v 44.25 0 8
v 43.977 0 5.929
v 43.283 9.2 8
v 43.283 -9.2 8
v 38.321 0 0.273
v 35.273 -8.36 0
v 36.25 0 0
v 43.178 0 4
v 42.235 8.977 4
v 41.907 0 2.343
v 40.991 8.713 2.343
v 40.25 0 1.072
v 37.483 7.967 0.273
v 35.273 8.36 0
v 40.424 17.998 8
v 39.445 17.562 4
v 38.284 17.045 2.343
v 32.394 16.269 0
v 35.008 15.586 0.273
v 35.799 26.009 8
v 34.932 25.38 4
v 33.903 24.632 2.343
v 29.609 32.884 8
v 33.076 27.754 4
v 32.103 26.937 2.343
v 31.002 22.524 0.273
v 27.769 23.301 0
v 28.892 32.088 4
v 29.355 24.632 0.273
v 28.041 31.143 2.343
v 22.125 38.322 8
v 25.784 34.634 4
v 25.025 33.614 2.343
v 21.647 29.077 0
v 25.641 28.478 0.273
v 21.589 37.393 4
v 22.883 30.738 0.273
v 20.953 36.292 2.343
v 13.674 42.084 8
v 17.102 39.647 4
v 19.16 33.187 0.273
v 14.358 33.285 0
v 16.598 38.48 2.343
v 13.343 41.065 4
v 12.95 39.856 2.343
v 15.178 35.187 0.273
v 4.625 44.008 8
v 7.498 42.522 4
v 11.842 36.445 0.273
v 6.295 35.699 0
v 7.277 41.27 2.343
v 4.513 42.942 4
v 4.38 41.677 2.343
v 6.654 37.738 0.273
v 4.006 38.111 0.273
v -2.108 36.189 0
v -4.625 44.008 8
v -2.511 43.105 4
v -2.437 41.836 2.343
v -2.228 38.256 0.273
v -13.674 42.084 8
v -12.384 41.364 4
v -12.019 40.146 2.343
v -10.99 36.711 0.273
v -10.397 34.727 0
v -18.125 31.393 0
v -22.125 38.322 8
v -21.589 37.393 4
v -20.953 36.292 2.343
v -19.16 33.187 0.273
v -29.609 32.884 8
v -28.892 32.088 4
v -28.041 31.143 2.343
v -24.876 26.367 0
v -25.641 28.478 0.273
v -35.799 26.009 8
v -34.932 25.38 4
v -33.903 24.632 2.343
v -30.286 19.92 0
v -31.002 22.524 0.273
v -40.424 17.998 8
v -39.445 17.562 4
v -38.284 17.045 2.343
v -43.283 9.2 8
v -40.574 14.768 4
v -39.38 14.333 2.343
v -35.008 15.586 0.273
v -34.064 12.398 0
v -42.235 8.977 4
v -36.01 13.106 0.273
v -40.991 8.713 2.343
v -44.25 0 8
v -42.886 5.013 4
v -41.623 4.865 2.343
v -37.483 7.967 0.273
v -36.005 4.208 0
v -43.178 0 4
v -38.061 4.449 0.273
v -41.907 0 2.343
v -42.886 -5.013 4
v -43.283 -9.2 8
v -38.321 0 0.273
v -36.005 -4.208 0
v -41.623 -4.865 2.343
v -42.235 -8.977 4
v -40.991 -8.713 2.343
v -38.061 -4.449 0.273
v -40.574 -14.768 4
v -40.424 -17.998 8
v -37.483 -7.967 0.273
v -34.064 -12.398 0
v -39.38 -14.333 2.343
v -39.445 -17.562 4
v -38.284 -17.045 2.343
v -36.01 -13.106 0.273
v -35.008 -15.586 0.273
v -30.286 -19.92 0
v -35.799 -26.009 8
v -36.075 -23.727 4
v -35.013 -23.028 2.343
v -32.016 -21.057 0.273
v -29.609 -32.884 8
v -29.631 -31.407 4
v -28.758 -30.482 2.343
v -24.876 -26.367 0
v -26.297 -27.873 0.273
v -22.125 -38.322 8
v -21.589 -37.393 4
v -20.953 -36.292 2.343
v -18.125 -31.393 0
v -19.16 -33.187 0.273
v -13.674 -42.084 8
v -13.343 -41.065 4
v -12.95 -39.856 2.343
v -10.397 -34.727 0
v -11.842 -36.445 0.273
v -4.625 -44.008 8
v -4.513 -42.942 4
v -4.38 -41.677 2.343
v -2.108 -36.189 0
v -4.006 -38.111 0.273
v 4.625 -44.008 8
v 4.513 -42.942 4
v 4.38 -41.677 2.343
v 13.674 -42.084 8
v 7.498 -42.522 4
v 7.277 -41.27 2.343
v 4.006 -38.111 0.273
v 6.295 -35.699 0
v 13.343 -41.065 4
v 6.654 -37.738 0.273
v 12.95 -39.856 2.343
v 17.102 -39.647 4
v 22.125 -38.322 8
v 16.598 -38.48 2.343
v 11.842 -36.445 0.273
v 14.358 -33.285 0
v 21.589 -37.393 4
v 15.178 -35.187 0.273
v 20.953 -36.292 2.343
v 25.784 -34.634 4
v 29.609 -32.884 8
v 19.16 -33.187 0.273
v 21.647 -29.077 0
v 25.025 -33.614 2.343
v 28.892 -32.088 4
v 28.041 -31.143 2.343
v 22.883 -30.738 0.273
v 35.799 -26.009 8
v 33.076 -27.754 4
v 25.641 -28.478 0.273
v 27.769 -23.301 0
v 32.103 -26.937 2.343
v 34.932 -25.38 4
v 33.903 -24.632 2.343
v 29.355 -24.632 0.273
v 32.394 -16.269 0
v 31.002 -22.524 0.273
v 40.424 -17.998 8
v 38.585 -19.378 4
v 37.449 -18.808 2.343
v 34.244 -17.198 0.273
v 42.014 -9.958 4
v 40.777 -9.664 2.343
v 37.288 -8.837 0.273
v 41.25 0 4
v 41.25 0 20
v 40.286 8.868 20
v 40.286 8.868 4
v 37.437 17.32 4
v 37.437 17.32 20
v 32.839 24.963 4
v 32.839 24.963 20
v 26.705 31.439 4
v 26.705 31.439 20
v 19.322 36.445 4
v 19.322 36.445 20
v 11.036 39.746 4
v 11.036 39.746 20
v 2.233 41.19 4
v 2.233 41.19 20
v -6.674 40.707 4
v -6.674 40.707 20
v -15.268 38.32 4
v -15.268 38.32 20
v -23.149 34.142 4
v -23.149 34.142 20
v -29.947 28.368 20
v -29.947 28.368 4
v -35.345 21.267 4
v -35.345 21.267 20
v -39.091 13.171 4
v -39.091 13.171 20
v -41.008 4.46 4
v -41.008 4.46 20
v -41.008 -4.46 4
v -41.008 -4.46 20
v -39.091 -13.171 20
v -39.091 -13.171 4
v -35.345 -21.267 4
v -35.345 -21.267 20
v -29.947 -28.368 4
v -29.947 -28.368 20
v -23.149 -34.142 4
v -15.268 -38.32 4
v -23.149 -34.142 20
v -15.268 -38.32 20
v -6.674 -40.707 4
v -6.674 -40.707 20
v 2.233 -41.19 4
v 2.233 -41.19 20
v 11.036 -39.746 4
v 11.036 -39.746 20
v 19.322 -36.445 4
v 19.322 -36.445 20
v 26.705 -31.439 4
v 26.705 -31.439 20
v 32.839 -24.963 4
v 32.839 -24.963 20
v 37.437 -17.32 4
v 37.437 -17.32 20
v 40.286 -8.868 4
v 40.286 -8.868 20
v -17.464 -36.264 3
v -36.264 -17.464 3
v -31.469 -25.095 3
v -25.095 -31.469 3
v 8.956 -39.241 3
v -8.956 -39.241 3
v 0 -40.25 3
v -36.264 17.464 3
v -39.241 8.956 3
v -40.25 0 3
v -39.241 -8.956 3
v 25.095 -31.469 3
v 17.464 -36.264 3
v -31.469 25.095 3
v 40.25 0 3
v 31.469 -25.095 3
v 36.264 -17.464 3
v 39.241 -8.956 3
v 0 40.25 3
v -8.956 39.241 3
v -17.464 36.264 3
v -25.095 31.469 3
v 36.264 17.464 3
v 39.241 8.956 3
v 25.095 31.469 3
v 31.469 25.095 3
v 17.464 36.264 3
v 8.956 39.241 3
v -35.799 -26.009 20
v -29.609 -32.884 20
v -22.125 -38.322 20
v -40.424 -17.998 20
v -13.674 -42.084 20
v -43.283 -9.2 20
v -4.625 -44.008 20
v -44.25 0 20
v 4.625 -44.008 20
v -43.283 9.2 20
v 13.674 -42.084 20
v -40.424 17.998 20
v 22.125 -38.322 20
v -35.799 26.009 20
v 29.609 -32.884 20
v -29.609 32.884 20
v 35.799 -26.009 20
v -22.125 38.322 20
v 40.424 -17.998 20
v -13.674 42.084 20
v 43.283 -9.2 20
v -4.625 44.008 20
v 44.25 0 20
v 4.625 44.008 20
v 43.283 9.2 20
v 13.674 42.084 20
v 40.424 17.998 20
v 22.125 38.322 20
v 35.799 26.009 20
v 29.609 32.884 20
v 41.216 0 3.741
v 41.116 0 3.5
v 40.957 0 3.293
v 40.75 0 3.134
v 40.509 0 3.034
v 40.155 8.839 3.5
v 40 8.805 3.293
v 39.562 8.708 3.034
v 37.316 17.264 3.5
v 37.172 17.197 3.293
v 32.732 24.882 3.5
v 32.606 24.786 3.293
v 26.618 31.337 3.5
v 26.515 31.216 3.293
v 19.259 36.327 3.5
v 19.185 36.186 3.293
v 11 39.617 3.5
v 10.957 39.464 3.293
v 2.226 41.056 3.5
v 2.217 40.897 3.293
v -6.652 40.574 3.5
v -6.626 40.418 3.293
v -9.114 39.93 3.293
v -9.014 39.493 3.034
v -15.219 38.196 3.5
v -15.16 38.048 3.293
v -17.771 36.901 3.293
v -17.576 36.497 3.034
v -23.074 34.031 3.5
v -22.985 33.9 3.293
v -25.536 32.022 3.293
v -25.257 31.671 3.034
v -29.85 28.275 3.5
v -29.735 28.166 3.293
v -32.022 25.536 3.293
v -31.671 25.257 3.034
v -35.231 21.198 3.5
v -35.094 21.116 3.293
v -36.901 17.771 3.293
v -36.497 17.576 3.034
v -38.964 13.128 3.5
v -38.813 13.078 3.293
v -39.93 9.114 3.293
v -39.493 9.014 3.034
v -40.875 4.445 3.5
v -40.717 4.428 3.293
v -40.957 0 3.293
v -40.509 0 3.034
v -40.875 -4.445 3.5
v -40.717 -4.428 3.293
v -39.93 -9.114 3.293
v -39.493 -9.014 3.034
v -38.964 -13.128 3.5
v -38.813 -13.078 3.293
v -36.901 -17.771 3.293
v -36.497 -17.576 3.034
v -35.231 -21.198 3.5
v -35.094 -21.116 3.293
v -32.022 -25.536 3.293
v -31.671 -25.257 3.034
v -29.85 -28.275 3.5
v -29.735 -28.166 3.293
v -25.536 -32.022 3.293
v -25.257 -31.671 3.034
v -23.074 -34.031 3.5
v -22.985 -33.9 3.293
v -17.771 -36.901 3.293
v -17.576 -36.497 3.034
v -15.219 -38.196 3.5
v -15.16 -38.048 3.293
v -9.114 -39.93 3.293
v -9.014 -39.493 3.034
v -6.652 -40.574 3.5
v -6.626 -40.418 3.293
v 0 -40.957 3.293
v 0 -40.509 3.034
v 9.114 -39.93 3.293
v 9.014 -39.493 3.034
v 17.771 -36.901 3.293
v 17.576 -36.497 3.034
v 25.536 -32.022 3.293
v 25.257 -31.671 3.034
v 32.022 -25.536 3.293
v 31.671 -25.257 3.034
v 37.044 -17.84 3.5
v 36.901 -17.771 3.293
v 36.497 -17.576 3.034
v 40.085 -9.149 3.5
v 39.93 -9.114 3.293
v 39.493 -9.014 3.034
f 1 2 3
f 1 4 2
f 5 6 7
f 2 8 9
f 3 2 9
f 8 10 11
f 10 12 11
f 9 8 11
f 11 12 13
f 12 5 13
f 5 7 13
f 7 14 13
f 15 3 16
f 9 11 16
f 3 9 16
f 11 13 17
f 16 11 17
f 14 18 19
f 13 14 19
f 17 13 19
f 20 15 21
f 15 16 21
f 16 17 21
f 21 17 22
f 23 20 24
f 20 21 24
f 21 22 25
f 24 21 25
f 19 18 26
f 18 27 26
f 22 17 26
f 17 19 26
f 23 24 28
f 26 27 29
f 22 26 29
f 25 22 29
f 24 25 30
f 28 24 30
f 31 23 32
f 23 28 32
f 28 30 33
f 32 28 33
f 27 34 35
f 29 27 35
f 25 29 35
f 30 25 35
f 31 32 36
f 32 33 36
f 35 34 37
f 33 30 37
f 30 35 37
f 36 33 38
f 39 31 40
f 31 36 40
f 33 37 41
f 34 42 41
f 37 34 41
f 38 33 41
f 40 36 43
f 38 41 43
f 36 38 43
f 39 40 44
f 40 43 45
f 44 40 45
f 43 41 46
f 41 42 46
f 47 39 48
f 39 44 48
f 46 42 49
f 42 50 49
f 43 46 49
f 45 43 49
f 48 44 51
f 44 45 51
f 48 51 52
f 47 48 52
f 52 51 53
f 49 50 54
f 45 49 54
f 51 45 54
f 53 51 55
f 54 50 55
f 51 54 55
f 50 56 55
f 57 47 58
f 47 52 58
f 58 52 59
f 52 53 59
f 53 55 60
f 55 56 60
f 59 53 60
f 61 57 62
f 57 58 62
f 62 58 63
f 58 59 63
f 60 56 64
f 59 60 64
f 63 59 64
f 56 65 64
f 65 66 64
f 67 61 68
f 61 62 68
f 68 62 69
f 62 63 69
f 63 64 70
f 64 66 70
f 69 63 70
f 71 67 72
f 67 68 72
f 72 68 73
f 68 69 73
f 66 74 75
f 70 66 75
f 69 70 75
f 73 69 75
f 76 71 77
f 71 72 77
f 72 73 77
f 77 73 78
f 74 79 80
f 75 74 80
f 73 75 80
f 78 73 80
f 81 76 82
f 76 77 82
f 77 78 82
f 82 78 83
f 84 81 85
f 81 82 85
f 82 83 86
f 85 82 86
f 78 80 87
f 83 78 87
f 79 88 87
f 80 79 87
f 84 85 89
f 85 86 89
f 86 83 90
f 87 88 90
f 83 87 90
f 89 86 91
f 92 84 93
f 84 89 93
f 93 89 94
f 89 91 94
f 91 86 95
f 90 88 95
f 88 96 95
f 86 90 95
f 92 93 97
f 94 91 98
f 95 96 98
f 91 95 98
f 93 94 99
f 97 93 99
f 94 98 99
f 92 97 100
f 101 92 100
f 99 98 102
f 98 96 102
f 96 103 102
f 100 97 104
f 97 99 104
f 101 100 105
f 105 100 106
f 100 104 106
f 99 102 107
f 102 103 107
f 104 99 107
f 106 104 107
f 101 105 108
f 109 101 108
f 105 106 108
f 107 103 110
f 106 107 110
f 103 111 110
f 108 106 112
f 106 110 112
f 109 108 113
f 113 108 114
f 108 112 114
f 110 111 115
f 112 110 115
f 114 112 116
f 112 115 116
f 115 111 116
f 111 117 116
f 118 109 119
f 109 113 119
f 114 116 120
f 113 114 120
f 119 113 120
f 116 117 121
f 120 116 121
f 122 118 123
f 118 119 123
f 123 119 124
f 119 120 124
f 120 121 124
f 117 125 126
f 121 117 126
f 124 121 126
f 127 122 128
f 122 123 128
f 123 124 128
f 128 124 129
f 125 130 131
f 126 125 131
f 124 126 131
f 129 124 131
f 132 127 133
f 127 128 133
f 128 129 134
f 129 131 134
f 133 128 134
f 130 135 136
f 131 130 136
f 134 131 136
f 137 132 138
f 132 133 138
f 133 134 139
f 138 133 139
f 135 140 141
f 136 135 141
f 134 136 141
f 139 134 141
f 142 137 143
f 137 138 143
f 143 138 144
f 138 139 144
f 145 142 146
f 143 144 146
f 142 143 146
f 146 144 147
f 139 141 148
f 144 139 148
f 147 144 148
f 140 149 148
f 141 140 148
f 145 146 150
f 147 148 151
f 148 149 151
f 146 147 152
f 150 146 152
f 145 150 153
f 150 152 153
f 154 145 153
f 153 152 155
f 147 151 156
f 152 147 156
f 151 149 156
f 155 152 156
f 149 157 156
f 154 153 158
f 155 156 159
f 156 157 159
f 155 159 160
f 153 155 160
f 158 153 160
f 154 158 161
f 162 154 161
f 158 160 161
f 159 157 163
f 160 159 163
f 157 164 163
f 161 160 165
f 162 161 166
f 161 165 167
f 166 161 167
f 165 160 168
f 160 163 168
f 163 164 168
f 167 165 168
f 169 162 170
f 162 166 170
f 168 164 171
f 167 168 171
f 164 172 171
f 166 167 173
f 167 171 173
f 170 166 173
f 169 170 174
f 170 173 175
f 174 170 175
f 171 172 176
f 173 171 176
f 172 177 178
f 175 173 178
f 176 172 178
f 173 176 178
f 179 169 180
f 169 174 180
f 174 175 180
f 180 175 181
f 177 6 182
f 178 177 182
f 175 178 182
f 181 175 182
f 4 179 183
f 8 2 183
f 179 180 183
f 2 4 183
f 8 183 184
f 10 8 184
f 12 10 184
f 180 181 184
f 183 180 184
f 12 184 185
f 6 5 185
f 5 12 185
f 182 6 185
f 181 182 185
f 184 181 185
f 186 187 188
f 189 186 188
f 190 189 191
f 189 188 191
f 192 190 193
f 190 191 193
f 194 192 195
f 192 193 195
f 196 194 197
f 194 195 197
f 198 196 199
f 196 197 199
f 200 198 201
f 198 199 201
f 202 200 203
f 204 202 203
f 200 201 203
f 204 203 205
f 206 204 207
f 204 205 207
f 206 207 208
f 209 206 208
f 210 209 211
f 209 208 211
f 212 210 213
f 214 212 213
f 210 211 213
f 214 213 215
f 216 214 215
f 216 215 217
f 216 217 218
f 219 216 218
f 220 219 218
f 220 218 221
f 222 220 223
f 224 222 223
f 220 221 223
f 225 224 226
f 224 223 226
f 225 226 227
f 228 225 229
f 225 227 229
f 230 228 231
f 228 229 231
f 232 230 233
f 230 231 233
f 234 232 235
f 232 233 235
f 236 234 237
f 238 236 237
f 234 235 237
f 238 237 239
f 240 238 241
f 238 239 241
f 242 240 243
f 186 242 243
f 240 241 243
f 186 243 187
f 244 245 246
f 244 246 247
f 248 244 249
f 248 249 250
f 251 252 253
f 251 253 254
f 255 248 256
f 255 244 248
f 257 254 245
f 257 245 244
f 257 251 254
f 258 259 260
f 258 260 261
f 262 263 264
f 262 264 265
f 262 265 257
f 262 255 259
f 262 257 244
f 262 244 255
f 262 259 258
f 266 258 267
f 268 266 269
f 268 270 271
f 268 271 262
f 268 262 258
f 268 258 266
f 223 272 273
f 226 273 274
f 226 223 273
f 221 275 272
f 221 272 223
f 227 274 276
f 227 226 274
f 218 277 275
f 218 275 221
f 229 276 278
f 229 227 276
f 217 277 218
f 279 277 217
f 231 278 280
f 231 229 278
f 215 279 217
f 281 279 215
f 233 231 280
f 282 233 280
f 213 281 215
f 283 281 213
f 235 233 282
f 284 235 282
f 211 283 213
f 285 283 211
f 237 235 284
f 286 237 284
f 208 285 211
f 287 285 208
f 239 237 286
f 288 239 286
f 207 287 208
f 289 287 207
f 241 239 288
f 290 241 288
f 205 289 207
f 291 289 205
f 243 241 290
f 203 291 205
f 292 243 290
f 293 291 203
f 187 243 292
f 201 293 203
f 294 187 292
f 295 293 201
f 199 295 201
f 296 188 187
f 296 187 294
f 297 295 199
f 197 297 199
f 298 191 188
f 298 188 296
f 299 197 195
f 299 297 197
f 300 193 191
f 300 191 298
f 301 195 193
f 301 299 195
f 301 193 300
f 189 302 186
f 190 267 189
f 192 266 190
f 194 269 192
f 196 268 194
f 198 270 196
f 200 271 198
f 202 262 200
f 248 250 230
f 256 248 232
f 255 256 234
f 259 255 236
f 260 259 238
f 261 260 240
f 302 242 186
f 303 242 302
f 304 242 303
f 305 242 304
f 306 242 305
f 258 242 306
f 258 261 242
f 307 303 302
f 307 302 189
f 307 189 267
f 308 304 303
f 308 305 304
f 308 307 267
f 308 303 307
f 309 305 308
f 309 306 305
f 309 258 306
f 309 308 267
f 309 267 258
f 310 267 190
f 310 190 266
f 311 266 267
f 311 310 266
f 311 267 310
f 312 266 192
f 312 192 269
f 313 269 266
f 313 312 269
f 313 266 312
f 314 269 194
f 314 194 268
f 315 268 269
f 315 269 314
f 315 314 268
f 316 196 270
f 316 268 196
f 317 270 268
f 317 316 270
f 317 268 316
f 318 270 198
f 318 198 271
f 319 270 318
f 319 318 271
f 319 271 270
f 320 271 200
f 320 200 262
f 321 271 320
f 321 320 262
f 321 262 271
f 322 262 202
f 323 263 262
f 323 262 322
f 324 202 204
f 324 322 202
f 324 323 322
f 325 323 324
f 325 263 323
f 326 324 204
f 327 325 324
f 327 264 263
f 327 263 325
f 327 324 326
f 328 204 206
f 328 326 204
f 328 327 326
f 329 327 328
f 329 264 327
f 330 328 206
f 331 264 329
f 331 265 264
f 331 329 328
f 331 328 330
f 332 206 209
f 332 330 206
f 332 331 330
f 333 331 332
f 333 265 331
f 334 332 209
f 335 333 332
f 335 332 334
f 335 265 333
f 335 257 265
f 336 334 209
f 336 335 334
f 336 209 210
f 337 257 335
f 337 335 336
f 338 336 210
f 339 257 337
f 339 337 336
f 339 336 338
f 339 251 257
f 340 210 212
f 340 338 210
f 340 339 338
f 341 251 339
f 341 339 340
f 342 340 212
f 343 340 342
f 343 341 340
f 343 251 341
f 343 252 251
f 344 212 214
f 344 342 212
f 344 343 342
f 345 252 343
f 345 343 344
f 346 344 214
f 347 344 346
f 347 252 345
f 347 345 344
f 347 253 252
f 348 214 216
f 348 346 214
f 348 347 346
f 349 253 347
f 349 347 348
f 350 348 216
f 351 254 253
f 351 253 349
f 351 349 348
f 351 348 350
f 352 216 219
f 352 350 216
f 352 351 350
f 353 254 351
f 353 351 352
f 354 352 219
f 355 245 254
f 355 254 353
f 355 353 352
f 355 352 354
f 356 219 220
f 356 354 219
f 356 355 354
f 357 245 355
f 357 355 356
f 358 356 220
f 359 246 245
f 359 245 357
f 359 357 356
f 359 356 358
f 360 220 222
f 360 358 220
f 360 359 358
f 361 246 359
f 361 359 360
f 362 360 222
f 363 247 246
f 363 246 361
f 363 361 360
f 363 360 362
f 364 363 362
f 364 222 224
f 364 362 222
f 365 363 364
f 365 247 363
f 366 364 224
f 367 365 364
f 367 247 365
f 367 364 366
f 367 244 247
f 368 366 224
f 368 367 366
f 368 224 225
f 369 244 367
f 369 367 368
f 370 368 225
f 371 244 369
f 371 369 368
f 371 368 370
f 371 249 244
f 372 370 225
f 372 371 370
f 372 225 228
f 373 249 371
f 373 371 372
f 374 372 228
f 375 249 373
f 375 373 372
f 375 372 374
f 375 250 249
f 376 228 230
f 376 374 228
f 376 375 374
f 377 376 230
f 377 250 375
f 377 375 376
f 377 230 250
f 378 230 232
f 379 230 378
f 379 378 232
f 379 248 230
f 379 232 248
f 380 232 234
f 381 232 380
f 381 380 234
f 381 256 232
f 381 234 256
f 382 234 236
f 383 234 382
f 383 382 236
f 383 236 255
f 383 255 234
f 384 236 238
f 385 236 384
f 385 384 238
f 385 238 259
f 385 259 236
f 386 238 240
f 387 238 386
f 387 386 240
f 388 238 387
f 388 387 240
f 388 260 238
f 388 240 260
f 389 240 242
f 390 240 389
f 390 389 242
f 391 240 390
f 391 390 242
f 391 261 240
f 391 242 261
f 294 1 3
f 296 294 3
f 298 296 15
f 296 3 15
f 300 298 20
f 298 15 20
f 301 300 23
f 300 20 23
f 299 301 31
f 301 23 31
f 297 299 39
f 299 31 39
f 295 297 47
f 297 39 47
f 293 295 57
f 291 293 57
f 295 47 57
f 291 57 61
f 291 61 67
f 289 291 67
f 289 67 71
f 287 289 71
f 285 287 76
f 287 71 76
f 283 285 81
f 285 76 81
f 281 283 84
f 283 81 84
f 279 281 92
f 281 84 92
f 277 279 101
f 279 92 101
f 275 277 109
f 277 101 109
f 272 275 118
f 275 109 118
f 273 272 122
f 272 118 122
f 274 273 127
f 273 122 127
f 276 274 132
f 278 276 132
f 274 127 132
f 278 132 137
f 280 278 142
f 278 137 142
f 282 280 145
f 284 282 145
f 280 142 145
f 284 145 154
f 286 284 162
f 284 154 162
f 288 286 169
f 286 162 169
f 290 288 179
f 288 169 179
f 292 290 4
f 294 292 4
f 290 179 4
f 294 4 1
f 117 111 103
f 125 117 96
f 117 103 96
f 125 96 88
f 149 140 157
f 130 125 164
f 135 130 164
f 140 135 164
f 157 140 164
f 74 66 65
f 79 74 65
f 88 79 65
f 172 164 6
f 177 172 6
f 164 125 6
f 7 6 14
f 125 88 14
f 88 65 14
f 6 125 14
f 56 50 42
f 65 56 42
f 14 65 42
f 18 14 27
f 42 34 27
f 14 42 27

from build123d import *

# Parameters (mm, degrees)
F0_R     = 44.25
F1_DEPTH = 20
F2_R     = 41.25
F3_DEPTH = 17
F4_R     = 1
F5_R     = 8


with BuildPart() as f1:
    # F0 (on Top) → F1 (new body)
    with BuildSketch(Plane.XY):
        Circle(F0_R)
    extrude(amount=F1_DEPTH)

    # F2 (on face) → F3 (cut)
    with BuildSketch(Plane.XY.offset(20)):
        Circle(F2_R)
    extrude(amount=-F3_DEPTH, mode=Mode.SUBTRACT)

    # F4
    f4_edges = [f1.edges().sort_by_distance(p)[0] for p in [
        (-41.25, 0, 3),
    ]]
    fillet(f4_edges, radius=F4_R)

    # F5
    f5_edges = [f1.edges().sort_by_distance(p)[0] for p in [
        (-44.25, 0, 0),
    ]]
    fillet(f5_edges, radius=F5_R)


solid = f1.part
